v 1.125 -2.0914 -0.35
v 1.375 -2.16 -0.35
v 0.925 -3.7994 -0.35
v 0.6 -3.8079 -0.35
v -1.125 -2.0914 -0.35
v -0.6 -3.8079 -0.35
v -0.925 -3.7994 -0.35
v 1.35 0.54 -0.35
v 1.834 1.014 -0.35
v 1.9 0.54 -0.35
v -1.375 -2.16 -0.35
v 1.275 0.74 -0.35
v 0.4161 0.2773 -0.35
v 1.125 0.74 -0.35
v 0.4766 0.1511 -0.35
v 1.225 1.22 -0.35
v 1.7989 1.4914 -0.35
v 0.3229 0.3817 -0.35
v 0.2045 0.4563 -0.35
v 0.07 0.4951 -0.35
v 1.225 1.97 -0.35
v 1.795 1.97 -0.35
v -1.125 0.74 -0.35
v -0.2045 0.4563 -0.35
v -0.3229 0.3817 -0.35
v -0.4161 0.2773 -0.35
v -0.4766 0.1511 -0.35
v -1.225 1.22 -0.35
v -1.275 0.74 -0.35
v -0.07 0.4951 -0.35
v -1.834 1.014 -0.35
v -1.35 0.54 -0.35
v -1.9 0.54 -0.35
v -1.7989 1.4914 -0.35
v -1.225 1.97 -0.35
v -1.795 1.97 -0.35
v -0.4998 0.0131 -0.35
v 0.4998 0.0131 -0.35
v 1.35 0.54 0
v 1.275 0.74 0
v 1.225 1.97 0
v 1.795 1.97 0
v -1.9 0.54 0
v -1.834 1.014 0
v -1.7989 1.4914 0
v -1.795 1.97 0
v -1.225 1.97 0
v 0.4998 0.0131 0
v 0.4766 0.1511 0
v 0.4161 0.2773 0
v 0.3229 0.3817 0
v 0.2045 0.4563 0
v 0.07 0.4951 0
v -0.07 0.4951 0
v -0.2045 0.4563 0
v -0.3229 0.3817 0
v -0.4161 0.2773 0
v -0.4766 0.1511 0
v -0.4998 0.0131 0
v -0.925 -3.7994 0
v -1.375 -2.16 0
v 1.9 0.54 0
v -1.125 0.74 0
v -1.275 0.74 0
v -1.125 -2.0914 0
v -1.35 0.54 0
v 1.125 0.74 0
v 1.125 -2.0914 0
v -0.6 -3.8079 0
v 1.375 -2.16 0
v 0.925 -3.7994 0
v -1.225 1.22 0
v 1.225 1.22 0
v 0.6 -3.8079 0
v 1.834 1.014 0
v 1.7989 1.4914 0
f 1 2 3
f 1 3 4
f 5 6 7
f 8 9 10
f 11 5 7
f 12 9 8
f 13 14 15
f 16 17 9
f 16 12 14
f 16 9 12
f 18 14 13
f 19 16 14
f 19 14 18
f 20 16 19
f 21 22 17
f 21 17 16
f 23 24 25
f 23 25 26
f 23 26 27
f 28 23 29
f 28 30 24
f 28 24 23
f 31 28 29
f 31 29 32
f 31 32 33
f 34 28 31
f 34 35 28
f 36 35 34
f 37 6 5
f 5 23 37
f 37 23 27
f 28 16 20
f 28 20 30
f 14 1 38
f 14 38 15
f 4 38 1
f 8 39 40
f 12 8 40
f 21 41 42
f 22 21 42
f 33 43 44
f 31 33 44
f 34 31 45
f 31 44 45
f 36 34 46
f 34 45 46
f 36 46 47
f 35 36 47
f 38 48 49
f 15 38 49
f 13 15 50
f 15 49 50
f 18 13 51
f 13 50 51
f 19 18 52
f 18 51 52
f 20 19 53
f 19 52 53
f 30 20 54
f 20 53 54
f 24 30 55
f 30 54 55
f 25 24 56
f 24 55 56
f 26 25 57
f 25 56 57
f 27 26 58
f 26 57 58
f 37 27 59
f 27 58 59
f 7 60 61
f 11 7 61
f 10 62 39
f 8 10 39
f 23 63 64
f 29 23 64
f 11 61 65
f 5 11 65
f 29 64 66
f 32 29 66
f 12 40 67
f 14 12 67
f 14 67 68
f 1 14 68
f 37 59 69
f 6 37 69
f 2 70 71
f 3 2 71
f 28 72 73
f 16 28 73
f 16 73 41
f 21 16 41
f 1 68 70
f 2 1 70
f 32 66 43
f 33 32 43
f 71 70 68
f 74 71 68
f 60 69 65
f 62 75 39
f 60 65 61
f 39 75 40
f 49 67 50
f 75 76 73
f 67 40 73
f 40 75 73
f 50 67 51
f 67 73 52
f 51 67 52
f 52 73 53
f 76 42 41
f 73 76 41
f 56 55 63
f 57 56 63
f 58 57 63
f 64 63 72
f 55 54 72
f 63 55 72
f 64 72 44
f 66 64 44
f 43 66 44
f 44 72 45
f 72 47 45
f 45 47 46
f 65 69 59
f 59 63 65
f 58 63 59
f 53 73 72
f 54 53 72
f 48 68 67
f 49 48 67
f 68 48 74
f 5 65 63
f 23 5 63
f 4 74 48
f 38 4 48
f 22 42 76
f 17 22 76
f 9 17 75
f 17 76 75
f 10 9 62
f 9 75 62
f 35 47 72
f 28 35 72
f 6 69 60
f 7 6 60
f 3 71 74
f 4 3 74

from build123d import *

# Parameters (mm, degrees)
BASE_FLANGE1_DEPTH = 0.35


# Sheet-metal steps are written as plain solids
with BuildPart() as part:
    # Sketch1 → Base-Flange1 (new body)
    with BuildSketch(Plane.XY):
        with BuildLine():
            Line((-0.499828266, 0.013103606), (-0.6, -3.807879902))
            Line((-0.6, -3.807879902), (-0.925, -3.799359631))
            Line((-0.925, -3.799359631), (-1.375, -2.16))
            Line((-1.375, -2.16), (-1.125, -2.091375643))
            Line((-1.125, -2.091375643), (-1.125, 0.74))
            Line((-1.125, 0.74), (-1.275, 0.74))
            Line((-1.275, 0.74), (-1.35, 0.54))
            Line((-1.35, 0.54), (-1.9, 0.54))
            ThreePointArc((-1.9, 0.54), (-1.812546359, 1.252433474), (-1.795, 1.97))
            Line((-1.795, 1.97), (-1.225, 1.97))
            Line((-1.225, 1.97), (-1.225, 1.22))
            Line((-1.225, 1.22), (1.225, 1.22))
            Line((1.225, 1.22), (1.225, 1.97))
            Line((1.225, 1.97), (1.795, 1.97))
            ThreePointArc((1.795, 1.97), (1.812546359, 1.252433474), (1.9, 0.54))
            Line((1.9, 0.54), (1.35, 0.54))
            Line((1.35, 0.54), (1.275, 0.74))
            Line((1.275, 0.74), (1.125, 0.74))
            Line((1.125, 0.74), (1.125, -2.091375643))
            Line((1.125, -2.091375643), (1.375, -2.16))
            Line((1.375, -2.16), (0.925, -3.799359631))
            Line((0.925, -3.799359631), (0.6, -3.807879902))
            Line((0.6, -3.807879902), (0.499828266, 0.013103606))
            ThreePointArc((0.499828266, 0.013103606), (0, 0.5), (-0.499828266, 0.013103606))
        make_face()
    extrude(amount=-BASE_FLANGE1_DEPTH)


solid = part.part
